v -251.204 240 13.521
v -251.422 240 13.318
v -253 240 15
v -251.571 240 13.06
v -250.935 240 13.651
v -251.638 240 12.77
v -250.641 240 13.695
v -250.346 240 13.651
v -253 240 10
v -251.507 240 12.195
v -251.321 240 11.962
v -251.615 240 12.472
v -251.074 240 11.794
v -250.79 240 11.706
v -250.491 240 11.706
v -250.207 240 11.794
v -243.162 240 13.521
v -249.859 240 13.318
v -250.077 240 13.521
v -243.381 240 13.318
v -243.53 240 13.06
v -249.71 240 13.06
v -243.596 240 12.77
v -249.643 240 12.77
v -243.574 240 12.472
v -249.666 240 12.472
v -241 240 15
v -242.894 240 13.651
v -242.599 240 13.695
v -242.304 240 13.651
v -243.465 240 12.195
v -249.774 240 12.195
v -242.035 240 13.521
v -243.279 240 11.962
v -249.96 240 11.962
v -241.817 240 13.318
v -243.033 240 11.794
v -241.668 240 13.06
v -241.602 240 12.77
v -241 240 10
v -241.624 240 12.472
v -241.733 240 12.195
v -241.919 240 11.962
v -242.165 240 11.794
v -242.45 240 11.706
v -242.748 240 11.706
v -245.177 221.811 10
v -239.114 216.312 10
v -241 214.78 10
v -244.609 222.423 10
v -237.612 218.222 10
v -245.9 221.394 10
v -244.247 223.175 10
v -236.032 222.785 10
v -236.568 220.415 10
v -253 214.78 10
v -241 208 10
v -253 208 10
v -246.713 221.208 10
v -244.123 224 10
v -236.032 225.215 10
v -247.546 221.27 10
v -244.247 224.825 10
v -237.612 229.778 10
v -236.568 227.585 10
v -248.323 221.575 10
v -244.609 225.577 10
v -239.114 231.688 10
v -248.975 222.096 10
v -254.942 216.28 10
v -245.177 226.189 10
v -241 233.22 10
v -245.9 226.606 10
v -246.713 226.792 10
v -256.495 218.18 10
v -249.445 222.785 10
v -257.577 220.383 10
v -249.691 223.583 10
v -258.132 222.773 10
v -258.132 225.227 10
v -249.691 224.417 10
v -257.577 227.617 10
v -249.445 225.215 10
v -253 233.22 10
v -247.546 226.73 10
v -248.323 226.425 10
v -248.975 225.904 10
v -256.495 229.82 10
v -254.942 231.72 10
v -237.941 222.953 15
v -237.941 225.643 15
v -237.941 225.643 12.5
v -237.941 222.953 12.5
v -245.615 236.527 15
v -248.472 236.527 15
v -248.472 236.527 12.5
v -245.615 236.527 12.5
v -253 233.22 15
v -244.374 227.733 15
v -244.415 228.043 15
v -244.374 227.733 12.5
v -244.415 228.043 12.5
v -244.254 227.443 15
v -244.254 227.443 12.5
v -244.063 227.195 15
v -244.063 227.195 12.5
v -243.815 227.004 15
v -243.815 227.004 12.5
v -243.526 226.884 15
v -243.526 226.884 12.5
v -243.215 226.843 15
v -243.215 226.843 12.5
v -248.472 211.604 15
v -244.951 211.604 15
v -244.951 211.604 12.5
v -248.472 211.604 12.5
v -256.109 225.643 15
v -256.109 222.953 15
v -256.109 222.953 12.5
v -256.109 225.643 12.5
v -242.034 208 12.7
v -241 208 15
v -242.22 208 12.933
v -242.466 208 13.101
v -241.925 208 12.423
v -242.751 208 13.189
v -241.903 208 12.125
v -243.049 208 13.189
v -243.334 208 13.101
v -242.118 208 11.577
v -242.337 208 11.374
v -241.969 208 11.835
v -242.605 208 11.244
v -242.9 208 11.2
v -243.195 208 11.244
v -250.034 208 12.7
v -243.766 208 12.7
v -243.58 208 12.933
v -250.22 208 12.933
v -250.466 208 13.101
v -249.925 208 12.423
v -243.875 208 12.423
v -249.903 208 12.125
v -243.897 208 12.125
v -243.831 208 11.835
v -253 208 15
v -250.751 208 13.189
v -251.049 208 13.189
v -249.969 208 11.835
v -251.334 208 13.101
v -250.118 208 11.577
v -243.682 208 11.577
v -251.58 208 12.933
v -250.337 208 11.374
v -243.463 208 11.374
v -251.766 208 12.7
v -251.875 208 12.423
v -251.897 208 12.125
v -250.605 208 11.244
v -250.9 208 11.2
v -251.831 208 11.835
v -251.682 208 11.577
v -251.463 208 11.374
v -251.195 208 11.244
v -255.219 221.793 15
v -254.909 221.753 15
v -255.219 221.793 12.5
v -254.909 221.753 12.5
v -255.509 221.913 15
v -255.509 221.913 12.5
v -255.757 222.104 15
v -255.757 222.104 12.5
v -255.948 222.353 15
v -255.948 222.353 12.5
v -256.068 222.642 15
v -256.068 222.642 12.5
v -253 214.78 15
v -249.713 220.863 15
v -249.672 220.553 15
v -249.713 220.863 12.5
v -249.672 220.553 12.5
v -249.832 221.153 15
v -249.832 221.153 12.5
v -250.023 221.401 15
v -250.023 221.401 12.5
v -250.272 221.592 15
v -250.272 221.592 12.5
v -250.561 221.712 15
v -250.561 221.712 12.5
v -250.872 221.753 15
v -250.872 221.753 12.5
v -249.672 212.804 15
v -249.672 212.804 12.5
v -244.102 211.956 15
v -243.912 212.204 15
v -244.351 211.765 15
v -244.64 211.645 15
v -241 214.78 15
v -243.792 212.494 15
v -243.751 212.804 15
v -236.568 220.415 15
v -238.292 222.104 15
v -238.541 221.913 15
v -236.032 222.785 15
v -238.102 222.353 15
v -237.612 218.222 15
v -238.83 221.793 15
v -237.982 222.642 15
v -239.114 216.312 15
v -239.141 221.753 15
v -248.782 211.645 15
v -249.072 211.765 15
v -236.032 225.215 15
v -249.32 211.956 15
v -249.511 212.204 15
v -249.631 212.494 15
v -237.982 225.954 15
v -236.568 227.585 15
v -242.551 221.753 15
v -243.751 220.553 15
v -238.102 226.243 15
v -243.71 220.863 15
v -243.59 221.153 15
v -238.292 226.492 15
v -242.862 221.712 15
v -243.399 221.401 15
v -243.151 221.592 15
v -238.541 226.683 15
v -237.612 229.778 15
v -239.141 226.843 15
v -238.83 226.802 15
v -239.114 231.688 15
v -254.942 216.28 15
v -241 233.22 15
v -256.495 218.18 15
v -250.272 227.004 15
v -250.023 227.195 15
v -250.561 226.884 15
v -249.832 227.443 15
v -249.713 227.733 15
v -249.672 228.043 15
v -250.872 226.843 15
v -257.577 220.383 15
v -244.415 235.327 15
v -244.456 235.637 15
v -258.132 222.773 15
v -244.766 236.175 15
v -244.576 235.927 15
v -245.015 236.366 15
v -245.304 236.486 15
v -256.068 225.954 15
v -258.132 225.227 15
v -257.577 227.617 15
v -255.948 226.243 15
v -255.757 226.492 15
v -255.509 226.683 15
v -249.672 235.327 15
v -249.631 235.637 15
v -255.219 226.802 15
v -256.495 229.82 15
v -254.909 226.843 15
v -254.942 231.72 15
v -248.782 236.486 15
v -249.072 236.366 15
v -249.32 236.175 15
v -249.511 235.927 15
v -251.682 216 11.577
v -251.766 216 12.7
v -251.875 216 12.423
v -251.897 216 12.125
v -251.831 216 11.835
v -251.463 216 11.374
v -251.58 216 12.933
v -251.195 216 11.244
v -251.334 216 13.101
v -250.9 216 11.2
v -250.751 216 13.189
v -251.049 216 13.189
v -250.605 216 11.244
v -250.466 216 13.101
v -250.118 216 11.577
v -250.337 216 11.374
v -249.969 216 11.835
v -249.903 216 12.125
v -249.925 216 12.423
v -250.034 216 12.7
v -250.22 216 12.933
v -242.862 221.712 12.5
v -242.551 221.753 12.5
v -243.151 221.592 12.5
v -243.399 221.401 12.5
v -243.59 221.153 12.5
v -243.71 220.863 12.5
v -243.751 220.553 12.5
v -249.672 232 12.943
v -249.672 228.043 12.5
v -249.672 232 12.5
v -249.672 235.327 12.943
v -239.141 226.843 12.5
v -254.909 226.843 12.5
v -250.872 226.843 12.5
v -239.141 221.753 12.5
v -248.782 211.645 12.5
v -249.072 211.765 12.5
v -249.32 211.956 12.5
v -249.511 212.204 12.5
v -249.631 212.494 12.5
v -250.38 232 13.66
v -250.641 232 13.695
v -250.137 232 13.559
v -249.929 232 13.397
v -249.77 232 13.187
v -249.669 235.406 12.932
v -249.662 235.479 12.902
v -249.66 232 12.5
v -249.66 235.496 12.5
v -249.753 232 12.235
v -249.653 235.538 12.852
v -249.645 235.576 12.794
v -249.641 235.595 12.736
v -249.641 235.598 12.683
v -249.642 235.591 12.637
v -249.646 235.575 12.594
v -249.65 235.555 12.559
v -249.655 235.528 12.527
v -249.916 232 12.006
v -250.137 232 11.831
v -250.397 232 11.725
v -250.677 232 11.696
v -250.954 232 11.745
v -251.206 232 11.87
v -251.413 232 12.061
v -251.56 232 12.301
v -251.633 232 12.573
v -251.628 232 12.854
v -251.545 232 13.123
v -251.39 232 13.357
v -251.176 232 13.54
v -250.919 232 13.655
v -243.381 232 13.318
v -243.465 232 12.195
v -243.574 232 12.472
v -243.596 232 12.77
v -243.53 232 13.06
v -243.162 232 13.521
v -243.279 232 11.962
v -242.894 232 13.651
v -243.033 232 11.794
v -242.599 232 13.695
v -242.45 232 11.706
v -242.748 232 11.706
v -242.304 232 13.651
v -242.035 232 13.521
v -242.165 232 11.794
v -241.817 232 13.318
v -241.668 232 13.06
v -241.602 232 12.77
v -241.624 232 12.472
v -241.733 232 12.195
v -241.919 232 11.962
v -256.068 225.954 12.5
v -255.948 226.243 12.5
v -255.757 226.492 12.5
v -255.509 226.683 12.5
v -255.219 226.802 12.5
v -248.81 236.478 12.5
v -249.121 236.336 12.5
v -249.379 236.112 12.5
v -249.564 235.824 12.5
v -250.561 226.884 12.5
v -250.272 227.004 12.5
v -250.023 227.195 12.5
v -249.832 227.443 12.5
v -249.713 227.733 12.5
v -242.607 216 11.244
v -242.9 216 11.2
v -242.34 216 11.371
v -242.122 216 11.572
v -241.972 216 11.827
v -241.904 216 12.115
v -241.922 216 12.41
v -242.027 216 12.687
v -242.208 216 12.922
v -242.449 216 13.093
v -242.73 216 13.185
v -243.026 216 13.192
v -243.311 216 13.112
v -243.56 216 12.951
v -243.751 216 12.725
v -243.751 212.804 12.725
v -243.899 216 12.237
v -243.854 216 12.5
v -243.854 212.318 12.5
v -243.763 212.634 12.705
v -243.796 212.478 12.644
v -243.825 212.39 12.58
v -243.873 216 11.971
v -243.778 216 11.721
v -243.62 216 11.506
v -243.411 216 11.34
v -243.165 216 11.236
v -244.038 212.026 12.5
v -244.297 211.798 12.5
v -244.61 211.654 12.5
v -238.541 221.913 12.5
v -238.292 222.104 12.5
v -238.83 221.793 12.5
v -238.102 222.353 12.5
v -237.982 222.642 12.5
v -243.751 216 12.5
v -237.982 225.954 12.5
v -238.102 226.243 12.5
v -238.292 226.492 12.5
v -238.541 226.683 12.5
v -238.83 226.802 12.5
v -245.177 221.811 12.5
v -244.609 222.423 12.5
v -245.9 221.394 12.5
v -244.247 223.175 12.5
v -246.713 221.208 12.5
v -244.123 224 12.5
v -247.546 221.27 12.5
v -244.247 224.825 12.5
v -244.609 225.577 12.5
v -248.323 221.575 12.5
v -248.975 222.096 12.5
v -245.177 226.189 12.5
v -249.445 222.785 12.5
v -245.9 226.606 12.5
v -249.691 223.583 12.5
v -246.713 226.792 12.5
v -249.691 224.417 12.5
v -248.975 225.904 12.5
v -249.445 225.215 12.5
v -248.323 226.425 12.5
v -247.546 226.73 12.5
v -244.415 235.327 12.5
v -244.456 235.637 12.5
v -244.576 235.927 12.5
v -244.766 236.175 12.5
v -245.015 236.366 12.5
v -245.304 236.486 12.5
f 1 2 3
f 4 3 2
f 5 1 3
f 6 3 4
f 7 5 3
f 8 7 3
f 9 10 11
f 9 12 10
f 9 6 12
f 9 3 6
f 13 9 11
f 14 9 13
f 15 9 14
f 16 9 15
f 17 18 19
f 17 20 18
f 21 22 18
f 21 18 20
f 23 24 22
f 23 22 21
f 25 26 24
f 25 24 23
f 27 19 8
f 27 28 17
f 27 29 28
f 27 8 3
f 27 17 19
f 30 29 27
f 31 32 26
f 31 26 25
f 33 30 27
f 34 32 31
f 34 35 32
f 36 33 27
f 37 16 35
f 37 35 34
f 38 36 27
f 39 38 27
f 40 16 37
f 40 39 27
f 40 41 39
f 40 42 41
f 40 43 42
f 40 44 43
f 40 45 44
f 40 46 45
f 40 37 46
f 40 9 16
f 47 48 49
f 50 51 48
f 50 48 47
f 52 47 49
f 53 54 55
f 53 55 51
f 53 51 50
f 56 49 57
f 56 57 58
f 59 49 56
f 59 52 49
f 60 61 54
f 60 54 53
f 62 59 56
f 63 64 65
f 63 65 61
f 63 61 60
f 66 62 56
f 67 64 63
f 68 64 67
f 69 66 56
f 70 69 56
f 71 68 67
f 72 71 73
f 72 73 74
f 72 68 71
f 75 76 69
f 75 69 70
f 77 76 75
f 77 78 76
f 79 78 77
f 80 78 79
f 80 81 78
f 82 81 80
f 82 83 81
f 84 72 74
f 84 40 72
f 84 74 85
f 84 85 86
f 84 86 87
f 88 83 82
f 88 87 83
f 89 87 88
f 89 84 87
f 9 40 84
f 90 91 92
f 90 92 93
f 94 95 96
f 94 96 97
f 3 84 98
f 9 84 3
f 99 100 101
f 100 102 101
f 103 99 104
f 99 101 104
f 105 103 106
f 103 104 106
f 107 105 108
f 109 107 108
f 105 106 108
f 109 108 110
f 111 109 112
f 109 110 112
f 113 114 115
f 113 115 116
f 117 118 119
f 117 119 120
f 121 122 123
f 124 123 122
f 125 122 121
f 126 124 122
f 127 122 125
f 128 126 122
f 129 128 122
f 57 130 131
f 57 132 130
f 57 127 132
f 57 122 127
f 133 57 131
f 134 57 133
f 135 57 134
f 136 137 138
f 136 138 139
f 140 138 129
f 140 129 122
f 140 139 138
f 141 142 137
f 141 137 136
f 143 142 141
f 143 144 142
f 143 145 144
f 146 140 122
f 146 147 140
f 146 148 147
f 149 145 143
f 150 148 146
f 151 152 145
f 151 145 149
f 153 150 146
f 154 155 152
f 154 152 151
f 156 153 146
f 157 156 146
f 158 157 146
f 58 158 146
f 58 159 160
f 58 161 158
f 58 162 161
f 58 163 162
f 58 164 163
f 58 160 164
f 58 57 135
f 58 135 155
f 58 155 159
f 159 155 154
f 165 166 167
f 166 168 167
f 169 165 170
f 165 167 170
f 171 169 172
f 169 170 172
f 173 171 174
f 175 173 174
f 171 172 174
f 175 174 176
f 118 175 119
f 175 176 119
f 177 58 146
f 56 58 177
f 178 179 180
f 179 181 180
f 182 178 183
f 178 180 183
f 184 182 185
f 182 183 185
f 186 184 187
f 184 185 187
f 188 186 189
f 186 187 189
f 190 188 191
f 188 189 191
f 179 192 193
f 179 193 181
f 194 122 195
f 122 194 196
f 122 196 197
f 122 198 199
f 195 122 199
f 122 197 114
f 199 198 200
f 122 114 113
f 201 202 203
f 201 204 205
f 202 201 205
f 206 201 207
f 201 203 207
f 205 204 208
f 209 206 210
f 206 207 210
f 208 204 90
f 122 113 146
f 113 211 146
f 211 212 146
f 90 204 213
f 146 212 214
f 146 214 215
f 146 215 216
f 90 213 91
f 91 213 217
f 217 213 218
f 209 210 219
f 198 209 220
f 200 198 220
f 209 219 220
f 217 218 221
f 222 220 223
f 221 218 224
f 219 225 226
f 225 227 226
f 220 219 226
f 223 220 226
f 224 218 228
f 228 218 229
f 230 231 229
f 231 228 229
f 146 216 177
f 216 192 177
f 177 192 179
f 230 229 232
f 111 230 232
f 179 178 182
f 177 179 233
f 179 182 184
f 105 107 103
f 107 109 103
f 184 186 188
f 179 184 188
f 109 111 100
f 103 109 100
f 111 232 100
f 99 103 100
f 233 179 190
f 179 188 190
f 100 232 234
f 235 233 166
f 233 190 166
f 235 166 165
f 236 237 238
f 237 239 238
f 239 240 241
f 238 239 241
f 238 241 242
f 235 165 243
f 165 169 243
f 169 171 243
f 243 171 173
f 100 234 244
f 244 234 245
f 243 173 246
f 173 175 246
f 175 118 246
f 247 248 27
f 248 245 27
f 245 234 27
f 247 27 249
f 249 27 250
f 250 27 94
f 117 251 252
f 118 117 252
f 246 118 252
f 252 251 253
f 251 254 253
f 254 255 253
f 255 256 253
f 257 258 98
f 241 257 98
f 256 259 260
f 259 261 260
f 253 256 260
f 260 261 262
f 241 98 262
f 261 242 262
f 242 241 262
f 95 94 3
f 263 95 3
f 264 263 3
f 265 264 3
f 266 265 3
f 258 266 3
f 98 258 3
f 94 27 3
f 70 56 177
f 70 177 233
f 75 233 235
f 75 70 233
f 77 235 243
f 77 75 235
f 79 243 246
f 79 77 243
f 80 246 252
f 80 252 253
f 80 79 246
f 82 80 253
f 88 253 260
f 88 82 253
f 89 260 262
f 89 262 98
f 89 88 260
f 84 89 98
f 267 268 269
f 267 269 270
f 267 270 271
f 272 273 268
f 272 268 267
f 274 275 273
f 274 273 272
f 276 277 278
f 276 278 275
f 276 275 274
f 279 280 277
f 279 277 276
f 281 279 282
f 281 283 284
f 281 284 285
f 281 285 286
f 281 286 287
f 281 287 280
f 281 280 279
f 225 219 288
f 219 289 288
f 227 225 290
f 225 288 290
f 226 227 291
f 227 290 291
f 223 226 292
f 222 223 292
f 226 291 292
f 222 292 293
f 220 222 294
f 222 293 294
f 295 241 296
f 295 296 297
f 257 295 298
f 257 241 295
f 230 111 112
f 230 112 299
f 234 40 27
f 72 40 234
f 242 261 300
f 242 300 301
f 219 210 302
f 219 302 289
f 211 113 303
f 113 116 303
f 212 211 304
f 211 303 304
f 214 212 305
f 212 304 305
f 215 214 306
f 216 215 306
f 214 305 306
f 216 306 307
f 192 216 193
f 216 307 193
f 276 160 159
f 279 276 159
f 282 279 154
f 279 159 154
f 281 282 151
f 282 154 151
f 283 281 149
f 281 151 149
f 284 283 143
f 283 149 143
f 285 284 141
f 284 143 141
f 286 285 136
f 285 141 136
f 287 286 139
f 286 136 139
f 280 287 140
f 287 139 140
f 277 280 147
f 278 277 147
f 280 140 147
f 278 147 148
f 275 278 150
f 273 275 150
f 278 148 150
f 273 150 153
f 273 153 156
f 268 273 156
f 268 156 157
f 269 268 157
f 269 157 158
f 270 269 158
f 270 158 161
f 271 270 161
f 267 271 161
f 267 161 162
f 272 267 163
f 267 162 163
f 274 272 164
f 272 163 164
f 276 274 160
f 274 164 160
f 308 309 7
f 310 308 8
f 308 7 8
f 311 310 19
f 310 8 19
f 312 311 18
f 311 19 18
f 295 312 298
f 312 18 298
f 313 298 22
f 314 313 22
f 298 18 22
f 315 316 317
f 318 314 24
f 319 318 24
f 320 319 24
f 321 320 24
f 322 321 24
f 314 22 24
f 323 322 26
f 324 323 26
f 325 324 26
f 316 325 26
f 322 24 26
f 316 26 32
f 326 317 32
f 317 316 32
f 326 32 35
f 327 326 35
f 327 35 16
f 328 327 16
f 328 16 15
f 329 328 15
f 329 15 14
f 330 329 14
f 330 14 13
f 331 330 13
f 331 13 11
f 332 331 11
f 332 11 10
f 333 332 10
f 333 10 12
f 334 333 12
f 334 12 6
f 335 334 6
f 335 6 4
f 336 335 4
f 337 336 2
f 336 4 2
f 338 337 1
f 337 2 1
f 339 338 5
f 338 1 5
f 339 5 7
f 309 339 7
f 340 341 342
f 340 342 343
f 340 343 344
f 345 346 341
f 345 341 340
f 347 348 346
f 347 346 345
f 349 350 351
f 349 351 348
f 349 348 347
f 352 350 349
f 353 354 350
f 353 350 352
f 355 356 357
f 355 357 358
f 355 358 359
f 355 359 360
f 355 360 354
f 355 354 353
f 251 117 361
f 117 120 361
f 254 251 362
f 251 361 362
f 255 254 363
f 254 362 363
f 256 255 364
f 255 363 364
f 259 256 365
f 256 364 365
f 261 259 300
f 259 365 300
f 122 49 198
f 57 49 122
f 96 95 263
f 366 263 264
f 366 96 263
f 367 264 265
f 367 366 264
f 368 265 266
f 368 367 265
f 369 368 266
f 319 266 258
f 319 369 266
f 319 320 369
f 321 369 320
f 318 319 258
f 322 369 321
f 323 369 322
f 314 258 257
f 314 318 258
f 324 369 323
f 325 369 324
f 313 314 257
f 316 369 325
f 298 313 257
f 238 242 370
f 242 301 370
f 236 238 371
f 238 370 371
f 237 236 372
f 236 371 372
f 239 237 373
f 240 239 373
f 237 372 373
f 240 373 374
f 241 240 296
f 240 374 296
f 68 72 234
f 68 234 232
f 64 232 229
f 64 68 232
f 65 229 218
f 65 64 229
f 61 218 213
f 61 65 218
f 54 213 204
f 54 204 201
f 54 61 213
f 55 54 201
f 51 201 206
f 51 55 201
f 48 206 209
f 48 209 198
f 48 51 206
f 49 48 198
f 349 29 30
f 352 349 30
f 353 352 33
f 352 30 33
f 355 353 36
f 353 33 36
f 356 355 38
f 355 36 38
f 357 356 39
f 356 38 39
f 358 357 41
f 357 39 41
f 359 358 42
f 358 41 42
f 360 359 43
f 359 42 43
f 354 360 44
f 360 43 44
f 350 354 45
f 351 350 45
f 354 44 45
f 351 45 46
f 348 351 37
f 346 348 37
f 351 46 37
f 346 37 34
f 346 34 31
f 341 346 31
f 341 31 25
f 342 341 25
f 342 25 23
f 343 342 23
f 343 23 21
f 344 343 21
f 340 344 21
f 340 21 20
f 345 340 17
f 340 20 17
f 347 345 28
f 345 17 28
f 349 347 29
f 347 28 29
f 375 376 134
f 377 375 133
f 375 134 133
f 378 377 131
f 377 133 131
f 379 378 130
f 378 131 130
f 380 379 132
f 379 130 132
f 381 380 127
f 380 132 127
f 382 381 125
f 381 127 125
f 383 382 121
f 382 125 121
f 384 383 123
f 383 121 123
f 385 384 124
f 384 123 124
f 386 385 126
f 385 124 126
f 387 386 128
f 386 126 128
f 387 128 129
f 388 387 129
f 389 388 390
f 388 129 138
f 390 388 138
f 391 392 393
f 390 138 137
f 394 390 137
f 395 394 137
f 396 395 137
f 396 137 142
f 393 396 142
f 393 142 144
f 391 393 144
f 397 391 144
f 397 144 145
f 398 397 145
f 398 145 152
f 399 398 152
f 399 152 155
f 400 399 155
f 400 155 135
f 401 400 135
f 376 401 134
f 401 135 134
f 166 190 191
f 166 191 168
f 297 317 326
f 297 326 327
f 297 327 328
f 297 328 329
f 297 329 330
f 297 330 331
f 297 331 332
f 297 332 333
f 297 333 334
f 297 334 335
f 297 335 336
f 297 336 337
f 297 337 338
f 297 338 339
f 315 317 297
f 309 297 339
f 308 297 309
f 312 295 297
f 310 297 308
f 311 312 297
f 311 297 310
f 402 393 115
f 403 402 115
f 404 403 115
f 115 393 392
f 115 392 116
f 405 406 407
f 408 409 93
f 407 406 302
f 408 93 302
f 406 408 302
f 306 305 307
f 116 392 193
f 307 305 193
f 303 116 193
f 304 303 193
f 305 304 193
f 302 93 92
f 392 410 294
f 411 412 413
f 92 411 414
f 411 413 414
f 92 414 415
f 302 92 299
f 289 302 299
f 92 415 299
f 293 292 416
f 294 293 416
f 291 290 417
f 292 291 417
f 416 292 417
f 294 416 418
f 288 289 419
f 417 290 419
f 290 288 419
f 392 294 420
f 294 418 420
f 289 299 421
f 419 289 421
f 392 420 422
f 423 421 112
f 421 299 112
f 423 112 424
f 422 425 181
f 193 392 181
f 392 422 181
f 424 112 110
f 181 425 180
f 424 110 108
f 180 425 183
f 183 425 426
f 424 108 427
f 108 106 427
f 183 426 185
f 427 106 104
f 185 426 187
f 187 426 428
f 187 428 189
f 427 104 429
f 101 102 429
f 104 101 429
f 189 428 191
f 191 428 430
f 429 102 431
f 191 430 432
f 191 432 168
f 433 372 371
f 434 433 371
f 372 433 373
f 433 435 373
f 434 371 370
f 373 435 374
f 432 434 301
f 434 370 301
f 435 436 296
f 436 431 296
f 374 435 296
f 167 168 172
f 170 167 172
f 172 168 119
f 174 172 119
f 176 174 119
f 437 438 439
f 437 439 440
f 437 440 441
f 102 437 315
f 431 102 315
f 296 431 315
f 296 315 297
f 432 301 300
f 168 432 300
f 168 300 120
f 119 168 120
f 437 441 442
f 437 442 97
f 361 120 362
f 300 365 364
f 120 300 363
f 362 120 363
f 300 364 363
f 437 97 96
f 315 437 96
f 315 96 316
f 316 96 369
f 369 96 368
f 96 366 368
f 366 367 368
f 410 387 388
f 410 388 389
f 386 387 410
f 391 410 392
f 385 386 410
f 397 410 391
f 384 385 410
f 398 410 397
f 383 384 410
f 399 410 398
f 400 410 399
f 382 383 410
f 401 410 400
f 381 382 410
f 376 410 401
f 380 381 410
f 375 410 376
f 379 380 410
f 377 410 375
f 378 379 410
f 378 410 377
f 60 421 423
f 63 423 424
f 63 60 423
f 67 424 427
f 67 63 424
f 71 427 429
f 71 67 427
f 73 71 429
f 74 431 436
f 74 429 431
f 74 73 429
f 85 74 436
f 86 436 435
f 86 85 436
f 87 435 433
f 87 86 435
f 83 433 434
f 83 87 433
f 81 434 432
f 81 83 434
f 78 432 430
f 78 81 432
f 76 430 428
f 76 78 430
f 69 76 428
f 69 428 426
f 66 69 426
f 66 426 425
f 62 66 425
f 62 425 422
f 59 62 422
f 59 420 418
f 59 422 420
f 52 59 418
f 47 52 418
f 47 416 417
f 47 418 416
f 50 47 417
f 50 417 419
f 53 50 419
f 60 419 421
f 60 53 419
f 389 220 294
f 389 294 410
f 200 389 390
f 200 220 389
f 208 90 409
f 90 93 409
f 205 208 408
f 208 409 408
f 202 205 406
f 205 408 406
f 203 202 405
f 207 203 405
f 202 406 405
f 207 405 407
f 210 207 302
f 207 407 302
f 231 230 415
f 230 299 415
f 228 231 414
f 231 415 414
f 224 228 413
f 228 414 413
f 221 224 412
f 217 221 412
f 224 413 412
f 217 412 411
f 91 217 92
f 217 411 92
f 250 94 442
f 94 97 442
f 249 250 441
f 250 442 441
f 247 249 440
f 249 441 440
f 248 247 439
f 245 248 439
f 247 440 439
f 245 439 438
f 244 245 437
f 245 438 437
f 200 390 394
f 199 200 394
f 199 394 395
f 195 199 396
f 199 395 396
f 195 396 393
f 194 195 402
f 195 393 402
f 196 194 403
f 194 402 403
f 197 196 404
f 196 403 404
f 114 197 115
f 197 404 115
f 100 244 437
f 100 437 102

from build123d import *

# Parameters (mm, degrees)
SKETCH1_R           = 2.8
BOSS_EXTRUDE1_DEPTH = 5
CUT_EXTRUDE1_DEPTH  = 2.5
FILLET1_R           = 1.2
SKETCH3_R           = 1
CUT_EXTRUDE2_DEPTH  = 8
SKETCH4_R           = 1
CUT_EXTRUDE3_DEPTH  = 8


with BuildPart() as part:
    # Sketch1 → Boss-Extrude1 (new body)
    with BuildSketch(Plane.XY.offset(10)):
        with BuildLine():
            Line((-253, 240), (-241, 240))
            Line((-241, 240), (-241, 233.219543457))
            ThreePointArc((-241, 233.219543457), (-235.964643127, 224), (-241, 214.780456543))
            Line((-241, 214.780456543), (-241, 208))
            Line((-241, 208), (-253, 208))
            Line((-253, 208), (-253, 214.780456543))
            ThreePointArc((-253, 214.780456543), (-258.20228405, 224), (-253, 233.219543457))
            Line((-253, 233.219543457), (-253, 240))
        make_face()
        with Locations((-246.922635101, 224)):
            Circle(SKETCH1_R, mode=Mode.SUBTRACT)
    extrude(amount=BOSS_EXTRUDE1_DEPTH)

    # Sketch2 → Cut-Extrude1 (cut)
    with BuildSketch(Plane.XY.offset(15)):
        Polygon((-249.671711, 236.526764937), (-244.414971283, 236.526764937), (-244.414971283, 226.843297037), (-237.940881316, 226.843297037), (-237.940881316, 221.752559627), (-243.750962055, 221.752559627), (-243.750962055, 211.604094919), (-249.671711, 211.604094919), (-249.671711, 221.752559627), (-256.108895334, 221.752559627), (-256.108895334, 226.843297037), (-249.671711, 226.843297037), align=None)
    extrude(amount=-CUT_EXTRUDE1_DEPTH, mode=Mode.SUBTRACT)

    # Fillet1
    fillet1_edges = [part.edges().sort_by_distance(p)[0] for p in [
        (-249.671711, 226.843297037, 13.75),
        (-249.671711, 236.526764937, 13.75),
        (-244.414971283, 236.526764937, 13.75),
        (-244.414971283, 226.843297037, 13.75),
        (-237.940881316, 226.843297037, 13.75),
        (-237.940881316, 221.752559627, 13.75),
        (-243.750962055, 221.752559627, 13.75),
        (-243.750962055, 211.604094919, 13.75),
        (-249.671711, 211.604094919, 13.75),
        (-249.671711, 221.752559627, 13.75),
        (-256.108895334, 221.752559627, 13.75),
        (-256.108895334, 226.843297037, 13.75),
    ]]
    fillet(fillet1_edges, radius=FILLET1_R)

    # Sketch3 → Cut-Extrude2 (cut)
    with BuildSketch(Plane(origin=(0, 208, 0), x_dir=(-1, 0, 0), z_dir=(0, -1, 0))):
        with Locations(Location((250.9, -12.2, 0), (0, 0, 90))):
            Circle(SKETCH3_R)
        with Locations(Location((242.9, -12.2, 0), (0, 0, 90))):
            Circle(SKETCH3_R)
    extrude(amount=-CUT_EXTRUDE2_DEPTH, mode=Mode.SUBTRACT)

    # Sketch4 → Cut-Extrude3 (cut)
    with BuildSketch(Plane(origin=(0, 240, 0), x_dir=(1, 0, 0), z_dir=(0, 1, 0))):
        with Locations(Location((-242.598801613, -12.694978247, 0), (0, 0, 270))):
            Circle(SKETCH4_R)
        with Locations(Location((-250.64051394, -12.694978247, 0), (0, 0, 270))):
            Circle(SKETCH4_R)
    extrude(amount=-CUT_EXTRUDE3_DEPTH, mode=Mode.SUBTRACT)


solid = part.part
